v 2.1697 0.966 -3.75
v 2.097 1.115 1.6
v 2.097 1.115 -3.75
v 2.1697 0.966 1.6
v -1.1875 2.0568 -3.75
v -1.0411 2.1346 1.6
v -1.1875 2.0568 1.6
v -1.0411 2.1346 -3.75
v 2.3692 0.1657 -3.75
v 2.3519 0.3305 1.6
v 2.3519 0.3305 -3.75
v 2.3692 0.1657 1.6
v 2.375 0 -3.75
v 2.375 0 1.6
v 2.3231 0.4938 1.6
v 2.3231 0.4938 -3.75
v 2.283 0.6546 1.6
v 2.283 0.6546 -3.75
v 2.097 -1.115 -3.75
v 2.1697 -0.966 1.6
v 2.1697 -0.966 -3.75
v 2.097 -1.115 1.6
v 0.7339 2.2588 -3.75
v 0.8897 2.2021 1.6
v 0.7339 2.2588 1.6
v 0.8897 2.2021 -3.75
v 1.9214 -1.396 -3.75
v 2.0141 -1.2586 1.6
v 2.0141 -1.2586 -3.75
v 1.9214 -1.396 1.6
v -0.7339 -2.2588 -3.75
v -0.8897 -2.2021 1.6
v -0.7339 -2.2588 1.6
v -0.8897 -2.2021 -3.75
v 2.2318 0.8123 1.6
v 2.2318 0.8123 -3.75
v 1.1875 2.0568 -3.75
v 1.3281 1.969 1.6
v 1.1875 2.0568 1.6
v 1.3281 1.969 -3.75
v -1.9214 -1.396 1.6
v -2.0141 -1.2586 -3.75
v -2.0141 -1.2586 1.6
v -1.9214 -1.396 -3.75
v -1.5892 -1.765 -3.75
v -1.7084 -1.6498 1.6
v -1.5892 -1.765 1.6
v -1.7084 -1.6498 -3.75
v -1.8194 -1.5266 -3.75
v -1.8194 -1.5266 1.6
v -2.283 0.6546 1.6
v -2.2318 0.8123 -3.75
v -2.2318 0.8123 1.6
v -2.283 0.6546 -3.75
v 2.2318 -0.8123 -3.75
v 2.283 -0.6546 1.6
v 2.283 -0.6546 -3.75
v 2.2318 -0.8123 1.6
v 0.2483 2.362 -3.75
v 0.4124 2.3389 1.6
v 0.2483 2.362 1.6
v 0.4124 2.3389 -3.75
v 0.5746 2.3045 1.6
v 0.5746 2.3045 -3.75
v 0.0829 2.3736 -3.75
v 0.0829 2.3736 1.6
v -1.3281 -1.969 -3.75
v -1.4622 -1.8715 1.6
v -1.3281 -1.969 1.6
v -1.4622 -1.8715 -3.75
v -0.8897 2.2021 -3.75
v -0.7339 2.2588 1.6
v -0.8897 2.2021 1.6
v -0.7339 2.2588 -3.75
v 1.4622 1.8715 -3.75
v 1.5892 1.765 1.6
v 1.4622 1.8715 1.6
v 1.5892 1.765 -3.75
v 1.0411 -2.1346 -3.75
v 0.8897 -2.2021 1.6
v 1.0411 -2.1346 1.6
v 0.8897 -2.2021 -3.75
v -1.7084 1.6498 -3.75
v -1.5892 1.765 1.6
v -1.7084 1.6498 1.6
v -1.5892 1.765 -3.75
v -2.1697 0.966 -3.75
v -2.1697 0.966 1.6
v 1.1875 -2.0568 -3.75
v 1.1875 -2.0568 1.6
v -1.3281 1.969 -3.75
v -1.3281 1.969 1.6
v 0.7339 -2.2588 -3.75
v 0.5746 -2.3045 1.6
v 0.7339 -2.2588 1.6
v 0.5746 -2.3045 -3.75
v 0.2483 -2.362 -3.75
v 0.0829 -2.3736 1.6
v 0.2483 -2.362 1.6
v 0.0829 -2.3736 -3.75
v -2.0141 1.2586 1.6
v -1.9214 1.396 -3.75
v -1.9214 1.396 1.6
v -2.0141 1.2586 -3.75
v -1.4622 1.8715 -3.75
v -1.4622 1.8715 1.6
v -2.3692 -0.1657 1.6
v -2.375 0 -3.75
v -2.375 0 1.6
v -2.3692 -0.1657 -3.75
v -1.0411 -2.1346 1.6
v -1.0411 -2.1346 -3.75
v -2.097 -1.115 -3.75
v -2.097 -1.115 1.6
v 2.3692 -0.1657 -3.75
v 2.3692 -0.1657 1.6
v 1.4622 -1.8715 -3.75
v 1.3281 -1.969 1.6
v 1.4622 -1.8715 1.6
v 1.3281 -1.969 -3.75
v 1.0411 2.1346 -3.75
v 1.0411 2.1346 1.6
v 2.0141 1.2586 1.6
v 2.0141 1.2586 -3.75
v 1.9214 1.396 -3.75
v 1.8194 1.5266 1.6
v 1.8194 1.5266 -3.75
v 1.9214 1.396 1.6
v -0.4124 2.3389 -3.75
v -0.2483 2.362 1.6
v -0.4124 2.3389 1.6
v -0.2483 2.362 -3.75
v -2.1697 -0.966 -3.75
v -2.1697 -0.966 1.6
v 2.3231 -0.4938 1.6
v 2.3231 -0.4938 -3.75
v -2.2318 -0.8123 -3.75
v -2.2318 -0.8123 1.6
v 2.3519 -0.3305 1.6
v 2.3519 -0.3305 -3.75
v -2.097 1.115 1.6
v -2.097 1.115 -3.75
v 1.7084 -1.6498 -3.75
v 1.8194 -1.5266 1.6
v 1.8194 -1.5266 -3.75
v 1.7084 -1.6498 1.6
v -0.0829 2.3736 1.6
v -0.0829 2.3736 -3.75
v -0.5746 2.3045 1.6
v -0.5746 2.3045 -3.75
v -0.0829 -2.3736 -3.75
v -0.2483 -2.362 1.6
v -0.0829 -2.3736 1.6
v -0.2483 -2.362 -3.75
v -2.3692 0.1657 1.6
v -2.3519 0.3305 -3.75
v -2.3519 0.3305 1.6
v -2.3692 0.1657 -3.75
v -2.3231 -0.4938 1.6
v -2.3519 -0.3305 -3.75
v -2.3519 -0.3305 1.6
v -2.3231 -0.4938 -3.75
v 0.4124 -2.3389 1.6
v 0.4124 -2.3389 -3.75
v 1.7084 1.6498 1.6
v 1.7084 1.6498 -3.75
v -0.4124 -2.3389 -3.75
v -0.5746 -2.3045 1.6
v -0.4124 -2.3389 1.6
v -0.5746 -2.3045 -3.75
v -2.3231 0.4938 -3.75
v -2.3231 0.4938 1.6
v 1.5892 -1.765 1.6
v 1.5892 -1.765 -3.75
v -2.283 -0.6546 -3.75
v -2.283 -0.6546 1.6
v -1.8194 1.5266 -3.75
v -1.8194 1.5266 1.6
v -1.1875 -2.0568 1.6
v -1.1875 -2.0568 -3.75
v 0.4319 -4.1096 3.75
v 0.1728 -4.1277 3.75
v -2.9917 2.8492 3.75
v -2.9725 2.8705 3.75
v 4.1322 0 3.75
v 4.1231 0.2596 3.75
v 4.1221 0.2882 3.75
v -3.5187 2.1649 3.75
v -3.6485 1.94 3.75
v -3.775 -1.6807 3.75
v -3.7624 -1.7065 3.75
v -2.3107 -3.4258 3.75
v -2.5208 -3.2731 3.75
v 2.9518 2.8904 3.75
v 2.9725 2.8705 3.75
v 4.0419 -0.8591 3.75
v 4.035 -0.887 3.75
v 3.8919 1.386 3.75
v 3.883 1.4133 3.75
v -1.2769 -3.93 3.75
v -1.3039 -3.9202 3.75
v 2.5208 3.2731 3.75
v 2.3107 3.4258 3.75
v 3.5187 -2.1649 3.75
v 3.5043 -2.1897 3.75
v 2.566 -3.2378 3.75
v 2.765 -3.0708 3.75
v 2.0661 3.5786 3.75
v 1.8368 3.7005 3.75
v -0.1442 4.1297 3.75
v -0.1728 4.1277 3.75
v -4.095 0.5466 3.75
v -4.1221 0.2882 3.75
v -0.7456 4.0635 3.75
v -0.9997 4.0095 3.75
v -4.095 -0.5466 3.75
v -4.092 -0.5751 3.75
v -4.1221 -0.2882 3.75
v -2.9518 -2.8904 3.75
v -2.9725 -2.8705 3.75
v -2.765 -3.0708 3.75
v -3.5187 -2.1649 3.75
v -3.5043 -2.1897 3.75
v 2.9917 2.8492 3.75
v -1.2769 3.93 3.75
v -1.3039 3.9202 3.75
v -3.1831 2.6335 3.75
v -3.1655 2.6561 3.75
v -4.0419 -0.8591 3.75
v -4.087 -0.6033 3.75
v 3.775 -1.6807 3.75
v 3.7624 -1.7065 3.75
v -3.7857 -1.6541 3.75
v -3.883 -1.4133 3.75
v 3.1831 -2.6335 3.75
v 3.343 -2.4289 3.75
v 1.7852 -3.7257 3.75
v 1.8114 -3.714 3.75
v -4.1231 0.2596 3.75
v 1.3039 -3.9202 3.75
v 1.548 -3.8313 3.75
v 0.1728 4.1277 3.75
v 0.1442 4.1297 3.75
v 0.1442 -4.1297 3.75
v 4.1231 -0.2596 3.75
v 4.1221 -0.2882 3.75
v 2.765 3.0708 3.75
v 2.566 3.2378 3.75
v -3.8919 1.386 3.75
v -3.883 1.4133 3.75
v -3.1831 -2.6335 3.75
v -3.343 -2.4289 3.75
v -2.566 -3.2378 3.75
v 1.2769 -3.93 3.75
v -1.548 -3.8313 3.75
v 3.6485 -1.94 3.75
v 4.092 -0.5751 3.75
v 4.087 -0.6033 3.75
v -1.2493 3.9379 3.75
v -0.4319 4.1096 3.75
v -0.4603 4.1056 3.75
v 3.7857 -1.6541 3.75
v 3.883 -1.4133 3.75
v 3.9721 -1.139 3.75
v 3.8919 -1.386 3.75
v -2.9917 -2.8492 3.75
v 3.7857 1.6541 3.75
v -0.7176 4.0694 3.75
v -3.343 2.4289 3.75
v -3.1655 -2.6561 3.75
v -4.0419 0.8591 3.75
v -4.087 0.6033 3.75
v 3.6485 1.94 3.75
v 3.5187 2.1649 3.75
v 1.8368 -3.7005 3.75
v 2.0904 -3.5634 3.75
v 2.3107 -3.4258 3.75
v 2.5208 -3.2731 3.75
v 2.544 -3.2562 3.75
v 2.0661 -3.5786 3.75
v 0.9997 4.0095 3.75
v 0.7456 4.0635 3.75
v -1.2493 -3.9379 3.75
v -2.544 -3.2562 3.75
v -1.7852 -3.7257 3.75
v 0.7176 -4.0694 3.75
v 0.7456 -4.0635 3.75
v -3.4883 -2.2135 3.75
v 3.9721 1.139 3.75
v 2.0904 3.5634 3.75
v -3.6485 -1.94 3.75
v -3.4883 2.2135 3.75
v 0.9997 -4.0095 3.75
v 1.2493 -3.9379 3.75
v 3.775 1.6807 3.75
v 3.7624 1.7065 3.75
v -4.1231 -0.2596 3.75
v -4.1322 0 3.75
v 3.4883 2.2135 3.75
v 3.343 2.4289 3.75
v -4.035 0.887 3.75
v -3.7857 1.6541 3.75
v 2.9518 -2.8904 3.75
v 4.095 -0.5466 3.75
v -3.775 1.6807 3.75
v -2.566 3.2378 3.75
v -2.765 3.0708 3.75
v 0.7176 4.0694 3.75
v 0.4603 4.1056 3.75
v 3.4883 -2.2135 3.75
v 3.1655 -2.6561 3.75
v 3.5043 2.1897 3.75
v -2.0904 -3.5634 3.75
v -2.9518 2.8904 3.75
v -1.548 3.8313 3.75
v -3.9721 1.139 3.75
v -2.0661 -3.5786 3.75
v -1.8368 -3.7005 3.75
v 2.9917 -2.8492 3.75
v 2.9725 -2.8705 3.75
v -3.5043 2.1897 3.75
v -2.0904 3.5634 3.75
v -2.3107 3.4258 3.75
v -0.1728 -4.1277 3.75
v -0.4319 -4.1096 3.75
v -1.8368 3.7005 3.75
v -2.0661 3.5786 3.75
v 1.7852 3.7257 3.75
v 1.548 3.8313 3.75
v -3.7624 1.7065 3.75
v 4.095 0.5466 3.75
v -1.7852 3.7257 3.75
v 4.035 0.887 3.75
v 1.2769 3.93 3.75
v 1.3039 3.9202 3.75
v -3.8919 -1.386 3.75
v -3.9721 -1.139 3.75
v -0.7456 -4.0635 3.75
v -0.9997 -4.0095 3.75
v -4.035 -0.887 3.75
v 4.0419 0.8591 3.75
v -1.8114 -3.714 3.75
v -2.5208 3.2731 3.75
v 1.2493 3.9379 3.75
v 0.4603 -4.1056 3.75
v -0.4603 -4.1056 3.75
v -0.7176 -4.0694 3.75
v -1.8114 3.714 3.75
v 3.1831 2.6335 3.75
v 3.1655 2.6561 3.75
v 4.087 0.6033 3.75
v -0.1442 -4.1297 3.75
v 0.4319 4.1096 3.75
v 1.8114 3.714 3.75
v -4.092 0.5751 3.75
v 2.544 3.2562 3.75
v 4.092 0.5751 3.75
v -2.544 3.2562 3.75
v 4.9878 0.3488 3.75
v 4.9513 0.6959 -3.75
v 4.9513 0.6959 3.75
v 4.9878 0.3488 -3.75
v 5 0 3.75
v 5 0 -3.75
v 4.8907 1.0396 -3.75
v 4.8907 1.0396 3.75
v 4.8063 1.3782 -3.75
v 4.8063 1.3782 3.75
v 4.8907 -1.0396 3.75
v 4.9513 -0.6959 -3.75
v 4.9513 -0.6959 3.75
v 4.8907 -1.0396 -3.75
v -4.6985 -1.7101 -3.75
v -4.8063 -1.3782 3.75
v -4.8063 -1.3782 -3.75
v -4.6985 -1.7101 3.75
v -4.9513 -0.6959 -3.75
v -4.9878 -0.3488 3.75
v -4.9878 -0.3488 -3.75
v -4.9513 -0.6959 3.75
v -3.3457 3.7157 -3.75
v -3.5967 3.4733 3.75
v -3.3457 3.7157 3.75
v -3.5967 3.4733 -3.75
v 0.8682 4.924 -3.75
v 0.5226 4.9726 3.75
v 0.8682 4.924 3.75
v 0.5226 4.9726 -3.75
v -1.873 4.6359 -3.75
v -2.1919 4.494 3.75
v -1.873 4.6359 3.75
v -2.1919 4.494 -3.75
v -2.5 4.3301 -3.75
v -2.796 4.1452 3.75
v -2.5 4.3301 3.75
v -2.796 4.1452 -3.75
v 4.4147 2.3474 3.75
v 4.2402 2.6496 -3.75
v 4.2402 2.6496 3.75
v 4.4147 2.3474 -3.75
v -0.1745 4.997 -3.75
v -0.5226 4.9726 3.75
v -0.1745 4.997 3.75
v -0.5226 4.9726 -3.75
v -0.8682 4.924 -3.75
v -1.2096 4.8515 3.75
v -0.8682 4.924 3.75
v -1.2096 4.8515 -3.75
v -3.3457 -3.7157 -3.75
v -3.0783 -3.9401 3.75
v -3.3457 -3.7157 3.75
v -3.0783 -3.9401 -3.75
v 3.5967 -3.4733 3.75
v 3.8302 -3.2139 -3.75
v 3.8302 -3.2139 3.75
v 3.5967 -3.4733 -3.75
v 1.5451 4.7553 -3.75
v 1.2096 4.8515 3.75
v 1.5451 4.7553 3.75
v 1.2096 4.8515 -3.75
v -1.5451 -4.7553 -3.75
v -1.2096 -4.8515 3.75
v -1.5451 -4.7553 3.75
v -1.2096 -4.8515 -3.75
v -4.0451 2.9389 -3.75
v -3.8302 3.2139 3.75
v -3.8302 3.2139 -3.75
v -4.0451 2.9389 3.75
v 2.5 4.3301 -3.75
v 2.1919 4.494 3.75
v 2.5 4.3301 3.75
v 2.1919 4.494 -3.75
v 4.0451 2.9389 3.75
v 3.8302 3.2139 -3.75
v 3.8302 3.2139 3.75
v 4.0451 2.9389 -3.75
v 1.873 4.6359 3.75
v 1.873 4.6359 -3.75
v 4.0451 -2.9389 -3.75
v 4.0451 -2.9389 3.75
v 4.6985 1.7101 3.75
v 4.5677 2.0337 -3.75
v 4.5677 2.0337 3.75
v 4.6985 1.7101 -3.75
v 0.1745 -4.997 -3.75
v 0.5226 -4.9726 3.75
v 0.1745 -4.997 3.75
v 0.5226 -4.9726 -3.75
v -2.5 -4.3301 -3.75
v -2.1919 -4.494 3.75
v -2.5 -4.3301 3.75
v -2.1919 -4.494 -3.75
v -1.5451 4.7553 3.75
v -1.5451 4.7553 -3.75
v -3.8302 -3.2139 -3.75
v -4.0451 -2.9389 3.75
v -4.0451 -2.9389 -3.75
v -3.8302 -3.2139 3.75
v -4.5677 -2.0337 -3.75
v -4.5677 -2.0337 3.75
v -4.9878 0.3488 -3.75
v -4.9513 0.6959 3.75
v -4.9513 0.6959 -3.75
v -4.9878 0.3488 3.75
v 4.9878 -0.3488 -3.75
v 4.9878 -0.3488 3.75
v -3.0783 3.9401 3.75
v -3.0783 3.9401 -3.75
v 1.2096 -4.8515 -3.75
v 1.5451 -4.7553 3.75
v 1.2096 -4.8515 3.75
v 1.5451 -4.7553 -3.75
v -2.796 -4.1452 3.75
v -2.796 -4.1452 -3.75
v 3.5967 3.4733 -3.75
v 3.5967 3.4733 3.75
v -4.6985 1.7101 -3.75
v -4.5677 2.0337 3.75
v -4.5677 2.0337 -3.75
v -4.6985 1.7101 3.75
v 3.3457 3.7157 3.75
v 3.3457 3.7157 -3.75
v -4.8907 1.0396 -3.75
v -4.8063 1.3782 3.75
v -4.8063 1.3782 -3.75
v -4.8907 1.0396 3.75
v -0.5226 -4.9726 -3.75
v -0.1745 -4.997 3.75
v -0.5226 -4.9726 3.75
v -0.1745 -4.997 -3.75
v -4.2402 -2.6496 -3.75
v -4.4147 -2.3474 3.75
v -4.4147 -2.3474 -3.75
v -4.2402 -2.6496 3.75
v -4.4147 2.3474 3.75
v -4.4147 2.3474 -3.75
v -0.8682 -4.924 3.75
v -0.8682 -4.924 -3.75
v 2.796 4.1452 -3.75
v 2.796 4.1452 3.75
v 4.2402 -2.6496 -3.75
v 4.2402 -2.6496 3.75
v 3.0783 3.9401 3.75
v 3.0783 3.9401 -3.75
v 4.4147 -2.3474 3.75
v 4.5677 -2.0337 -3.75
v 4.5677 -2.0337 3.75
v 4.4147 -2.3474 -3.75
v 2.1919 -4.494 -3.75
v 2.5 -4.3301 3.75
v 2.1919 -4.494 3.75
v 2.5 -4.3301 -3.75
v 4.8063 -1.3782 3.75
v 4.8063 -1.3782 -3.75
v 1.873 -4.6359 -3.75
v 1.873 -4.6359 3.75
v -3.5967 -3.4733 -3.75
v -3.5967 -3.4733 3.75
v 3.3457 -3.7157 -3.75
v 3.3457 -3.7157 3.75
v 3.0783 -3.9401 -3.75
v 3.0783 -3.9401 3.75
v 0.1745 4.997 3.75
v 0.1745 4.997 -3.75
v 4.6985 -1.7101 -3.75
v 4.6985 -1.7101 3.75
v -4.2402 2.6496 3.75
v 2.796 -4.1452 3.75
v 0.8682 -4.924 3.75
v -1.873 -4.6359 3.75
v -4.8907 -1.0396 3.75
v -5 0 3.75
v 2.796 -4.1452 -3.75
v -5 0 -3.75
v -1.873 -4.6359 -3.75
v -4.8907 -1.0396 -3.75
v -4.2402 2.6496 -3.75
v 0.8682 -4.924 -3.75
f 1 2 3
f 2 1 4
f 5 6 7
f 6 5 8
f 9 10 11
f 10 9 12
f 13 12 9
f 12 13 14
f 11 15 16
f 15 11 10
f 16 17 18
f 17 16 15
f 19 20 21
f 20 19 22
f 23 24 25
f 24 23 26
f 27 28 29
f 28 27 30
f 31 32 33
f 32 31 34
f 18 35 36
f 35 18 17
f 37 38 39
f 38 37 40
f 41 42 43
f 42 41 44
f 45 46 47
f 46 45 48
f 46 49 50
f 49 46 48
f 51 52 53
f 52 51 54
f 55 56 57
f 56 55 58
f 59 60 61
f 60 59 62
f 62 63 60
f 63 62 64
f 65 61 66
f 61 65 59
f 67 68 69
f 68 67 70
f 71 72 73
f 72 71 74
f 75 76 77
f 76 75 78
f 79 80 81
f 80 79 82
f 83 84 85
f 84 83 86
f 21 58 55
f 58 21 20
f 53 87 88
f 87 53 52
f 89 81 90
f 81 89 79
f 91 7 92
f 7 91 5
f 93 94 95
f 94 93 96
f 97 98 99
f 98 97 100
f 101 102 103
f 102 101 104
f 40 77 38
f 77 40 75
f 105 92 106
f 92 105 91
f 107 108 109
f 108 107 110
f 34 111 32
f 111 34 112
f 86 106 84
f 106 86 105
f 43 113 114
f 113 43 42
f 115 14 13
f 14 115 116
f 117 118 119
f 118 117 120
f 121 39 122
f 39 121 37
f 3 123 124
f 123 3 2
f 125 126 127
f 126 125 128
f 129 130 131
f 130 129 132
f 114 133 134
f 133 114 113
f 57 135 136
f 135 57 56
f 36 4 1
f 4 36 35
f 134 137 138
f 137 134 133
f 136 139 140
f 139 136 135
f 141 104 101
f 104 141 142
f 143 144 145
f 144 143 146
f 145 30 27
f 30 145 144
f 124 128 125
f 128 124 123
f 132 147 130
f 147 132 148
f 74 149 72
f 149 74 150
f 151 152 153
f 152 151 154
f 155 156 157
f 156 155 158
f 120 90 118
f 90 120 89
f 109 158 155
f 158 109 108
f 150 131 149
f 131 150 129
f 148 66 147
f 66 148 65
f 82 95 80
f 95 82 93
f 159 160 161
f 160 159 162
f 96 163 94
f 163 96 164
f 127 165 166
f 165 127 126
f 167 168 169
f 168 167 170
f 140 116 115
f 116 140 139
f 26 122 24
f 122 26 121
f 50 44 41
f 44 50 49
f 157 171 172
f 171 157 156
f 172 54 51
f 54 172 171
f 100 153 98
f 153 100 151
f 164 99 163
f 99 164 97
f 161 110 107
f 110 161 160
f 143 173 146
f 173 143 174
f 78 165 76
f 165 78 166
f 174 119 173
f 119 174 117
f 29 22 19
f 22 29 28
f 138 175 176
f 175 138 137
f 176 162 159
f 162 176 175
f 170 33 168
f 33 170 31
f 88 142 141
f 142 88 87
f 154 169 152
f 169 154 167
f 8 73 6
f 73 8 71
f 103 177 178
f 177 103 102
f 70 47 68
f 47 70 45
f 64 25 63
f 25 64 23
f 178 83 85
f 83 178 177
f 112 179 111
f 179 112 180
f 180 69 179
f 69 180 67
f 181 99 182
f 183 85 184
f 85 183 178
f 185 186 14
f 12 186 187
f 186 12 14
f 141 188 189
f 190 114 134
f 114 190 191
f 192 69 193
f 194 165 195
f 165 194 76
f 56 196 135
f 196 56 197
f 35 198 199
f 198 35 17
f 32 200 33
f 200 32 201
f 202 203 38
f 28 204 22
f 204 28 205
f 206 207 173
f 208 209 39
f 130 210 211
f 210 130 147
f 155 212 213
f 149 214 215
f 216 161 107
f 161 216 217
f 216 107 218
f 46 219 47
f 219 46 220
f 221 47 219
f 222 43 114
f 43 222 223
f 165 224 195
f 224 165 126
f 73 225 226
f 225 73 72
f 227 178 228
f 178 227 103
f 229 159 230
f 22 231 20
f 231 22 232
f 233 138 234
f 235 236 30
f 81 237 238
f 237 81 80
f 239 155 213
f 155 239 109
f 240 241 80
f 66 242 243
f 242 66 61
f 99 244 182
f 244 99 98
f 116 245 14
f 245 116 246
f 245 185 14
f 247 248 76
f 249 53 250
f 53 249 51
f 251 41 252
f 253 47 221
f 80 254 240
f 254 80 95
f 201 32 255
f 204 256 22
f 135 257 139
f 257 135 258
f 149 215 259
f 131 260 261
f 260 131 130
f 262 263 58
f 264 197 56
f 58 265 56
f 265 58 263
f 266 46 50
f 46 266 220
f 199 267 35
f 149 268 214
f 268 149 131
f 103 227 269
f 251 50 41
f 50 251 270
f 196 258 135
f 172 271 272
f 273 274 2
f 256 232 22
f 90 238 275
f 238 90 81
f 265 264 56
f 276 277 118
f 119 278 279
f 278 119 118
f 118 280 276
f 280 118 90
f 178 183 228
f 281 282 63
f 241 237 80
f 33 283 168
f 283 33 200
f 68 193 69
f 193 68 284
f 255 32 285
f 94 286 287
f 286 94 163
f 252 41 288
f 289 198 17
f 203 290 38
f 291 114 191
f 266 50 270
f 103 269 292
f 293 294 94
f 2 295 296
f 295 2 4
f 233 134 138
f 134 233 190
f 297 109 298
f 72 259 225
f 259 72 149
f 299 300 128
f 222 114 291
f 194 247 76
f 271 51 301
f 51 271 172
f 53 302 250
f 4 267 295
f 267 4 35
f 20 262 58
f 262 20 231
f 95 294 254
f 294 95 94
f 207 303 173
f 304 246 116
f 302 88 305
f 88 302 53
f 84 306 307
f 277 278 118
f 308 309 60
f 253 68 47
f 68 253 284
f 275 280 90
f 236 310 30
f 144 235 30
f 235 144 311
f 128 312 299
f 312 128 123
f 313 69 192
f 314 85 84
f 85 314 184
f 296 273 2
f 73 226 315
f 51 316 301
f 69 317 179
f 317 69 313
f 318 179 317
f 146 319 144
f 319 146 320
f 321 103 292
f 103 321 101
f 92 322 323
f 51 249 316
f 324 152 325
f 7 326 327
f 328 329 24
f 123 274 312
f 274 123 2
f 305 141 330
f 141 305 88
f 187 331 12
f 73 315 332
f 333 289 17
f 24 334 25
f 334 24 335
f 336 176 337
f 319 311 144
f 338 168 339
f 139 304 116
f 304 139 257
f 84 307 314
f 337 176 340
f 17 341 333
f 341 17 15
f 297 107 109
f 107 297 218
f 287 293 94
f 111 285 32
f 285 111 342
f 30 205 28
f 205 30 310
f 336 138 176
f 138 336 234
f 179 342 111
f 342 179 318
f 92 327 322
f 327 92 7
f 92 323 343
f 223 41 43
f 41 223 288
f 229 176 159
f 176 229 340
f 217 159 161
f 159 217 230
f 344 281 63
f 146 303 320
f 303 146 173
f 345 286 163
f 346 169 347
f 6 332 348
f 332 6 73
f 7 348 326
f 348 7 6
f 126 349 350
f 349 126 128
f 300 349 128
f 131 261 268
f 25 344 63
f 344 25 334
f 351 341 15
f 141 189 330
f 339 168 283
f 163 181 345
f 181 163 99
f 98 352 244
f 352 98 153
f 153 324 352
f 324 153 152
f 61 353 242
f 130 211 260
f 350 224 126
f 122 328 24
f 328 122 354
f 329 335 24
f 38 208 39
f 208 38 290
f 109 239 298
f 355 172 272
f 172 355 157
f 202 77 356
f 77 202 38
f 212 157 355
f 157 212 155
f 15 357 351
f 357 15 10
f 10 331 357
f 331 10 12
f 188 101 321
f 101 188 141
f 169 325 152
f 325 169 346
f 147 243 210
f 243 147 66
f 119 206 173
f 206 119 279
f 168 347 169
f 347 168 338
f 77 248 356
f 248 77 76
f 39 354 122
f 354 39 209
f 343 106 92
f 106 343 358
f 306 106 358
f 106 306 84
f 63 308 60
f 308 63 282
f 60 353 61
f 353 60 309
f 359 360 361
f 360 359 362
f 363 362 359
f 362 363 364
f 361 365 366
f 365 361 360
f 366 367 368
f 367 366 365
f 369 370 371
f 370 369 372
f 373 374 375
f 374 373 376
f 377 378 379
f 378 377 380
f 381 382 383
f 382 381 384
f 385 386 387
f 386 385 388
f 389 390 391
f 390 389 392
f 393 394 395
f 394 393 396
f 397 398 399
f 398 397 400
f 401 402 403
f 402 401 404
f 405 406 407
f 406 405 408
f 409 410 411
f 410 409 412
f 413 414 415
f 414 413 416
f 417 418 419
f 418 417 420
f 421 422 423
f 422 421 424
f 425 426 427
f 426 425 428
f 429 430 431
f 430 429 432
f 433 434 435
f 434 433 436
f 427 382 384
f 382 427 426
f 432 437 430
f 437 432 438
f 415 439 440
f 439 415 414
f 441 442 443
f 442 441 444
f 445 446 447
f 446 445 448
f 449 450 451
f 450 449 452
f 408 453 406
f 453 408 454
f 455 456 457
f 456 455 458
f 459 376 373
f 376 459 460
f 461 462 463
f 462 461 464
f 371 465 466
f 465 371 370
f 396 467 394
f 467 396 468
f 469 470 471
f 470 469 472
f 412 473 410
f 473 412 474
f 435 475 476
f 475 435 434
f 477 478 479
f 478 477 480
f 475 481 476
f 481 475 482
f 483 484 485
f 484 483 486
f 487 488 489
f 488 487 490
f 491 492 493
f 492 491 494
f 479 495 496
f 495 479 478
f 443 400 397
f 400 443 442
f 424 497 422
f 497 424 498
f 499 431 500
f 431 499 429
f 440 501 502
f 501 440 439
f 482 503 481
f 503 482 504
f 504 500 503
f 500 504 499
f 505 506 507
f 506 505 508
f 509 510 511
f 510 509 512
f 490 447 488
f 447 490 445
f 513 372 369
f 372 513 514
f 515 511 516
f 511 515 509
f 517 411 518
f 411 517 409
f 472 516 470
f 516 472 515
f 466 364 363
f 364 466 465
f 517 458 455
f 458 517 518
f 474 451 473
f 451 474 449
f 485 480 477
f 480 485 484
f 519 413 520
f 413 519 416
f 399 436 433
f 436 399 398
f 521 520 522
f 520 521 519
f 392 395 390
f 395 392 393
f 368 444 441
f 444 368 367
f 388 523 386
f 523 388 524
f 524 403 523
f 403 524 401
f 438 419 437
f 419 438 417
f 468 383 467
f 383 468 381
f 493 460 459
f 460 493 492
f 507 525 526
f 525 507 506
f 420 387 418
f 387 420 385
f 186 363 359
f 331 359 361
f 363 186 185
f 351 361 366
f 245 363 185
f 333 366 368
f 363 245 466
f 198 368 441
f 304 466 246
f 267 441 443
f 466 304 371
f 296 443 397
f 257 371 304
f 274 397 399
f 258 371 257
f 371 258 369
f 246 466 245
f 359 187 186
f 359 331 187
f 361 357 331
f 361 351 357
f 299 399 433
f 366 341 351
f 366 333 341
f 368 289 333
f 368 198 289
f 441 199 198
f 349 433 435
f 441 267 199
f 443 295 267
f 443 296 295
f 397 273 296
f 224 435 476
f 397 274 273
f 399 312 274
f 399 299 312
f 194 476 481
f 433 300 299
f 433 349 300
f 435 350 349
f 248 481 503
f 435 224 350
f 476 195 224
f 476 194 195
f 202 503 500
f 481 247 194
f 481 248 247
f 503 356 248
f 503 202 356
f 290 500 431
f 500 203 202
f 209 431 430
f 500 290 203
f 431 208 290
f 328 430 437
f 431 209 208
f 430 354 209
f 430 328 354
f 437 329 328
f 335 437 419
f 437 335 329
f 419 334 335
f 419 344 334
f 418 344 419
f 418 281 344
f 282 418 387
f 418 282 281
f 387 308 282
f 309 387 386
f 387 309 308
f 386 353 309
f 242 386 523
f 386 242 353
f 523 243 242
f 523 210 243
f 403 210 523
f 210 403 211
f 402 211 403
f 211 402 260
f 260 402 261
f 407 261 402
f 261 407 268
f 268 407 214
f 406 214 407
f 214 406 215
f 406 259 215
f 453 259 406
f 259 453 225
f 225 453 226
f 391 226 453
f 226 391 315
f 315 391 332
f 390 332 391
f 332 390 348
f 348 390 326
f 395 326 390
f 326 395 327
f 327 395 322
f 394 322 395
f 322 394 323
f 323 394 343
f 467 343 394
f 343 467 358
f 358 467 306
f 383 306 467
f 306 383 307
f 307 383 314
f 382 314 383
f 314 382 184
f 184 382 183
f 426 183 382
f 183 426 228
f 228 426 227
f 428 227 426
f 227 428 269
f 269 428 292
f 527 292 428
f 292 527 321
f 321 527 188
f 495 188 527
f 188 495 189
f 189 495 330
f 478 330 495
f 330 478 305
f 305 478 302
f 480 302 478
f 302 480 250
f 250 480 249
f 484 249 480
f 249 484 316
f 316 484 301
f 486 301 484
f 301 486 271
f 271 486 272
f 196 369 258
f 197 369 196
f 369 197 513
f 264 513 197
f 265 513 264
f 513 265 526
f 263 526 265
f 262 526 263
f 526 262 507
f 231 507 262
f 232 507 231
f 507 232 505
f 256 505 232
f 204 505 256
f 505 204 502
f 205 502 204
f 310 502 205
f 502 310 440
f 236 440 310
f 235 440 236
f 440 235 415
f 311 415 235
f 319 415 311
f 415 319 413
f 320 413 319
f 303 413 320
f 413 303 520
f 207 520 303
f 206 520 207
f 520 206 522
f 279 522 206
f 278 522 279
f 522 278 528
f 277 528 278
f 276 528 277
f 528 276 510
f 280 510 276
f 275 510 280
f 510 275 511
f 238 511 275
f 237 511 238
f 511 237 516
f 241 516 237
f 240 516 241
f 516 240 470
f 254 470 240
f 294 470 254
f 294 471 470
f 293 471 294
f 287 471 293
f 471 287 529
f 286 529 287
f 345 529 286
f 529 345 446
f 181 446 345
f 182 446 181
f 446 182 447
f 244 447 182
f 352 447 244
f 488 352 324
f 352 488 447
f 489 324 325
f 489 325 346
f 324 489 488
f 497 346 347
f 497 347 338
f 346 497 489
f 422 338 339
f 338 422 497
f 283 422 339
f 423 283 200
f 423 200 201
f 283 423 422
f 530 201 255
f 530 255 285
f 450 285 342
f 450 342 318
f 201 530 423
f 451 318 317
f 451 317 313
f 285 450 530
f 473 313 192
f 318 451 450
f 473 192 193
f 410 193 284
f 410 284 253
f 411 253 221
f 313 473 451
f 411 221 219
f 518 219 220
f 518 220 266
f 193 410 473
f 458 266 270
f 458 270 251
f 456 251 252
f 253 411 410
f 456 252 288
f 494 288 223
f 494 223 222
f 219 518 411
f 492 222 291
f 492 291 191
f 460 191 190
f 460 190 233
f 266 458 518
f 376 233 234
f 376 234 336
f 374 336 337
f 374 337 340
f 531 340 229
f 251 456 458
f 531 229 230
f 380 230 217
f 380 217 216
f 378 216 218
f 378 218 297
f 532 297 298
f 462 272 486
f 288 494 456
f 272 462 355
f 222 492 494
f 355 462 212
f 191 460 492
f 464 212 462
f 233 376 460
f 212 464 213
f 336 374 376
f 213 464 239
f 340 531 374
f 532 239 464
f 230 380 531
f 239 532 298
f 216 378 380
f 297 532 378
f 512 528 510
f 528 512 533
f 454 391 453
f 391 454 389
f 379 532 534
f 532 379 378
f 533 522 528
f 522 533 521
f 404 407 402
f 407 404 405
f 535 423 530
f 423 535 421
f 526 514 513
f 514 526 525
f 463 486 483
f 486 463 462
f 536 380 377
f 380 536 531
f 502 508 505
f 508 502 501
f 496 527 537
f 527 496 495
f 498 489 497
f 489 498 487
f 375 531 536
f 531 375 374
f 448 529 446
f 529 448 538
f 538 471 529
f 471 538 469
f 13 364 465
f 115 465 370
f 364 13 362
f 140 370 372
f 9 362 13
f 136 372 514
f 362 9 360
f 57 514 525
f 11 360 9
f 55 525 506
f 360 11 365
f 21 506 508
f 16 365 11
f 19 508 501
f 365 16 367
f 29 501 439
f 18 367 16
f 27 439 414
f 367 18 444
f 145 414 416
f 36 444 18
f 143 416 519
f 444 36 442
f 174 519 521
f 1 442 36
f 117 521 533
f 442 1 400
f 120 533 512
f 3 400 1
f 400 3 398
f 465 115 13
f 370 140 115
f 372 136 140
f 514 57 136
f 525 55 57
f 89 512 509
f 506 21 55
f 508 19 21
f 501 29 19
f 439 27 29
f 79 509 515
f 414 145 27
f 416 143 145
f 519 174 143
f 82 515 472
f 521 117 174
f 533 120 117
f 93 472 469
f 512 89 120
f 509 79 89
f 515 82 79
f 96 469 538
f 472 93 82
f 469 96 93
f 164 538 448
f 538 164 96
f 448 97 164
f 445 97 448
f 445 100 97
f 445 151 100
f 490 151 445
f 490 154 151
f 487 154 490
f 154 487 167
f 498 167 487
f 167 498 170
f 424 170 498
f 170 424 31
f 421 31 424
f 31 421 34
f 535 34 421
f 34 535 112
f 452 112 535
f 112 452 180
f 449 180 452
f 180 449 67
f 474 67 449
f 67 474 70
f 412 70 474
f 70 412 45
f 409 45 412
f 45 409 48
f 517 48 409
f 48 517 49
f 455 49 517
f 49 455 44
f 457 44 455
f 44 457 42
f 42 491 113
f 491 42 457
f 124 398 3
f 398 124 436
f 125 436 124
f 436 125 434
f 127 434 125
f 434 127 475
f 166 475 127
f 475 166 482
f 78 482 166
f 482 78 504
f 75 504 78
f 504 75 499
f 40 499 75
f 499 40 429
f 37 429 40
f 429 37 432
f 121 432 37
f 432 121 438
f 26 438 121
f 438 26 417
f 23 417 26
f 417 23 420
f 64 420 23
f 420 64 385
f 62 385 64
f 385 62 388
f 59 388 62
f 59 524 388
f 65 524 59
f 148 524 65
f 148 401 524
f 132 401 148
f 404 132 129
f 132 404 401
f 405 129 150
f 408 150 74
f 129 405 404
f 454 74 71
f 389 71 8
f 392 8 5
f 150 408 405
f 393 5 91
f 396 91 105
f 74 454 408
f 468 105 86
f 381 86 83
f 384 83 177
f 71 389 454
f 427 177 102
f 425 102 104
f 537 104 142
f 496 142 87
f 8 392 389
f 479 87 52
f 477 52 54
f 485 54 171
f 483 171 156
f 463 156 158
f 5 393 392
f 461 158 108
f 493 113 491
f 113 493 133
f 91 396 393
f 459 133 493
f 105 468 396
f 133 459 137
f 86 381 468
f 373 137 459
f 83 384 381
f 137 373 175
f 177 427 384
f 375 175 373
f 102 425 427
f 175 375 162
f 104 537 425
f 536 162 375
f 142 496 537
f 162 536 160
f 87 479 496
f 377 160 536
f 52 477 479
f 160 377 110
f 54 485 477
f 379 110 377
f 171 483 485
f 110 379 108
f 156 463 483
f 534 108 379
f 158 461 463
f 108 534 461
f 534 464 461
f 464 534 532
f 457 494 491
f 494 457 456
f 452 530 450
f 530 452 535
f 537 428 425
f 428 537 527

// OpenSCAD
// file: ../modules/chamferedScrew.scad
module chamferedScrewHole(rh, rs, d, ds, t = .1) {
  translate([0, 0, -t]) cylinder(r=rs, h=d + t);
  translate([0, 0, d - ds + t]) cylinder(r1=rs, r2=rh, h=ds + t);
}
// main file
include <../modules/chamferedScrew.scad>

$fa=4; // default minimum facet angle is now 0.5
$fs=0.05; // defaul

width = 48;
depth = 29;

wallThickness = 5;
strapThickness = 12.5;

screwHoleDiam = 4.75;
countersinkDiam = 9;

tabLen = 4.5;


difference() {
  cylinder(r = 5, h = 7.5, center = true);
  #translate([0, 0, -6]) rotate([0, 0, 0]) chamferedScrewHole(countersinkDiam / 2, screwHoleDiam / 2, wallThickness * 2, wallThickness / 2);
}
